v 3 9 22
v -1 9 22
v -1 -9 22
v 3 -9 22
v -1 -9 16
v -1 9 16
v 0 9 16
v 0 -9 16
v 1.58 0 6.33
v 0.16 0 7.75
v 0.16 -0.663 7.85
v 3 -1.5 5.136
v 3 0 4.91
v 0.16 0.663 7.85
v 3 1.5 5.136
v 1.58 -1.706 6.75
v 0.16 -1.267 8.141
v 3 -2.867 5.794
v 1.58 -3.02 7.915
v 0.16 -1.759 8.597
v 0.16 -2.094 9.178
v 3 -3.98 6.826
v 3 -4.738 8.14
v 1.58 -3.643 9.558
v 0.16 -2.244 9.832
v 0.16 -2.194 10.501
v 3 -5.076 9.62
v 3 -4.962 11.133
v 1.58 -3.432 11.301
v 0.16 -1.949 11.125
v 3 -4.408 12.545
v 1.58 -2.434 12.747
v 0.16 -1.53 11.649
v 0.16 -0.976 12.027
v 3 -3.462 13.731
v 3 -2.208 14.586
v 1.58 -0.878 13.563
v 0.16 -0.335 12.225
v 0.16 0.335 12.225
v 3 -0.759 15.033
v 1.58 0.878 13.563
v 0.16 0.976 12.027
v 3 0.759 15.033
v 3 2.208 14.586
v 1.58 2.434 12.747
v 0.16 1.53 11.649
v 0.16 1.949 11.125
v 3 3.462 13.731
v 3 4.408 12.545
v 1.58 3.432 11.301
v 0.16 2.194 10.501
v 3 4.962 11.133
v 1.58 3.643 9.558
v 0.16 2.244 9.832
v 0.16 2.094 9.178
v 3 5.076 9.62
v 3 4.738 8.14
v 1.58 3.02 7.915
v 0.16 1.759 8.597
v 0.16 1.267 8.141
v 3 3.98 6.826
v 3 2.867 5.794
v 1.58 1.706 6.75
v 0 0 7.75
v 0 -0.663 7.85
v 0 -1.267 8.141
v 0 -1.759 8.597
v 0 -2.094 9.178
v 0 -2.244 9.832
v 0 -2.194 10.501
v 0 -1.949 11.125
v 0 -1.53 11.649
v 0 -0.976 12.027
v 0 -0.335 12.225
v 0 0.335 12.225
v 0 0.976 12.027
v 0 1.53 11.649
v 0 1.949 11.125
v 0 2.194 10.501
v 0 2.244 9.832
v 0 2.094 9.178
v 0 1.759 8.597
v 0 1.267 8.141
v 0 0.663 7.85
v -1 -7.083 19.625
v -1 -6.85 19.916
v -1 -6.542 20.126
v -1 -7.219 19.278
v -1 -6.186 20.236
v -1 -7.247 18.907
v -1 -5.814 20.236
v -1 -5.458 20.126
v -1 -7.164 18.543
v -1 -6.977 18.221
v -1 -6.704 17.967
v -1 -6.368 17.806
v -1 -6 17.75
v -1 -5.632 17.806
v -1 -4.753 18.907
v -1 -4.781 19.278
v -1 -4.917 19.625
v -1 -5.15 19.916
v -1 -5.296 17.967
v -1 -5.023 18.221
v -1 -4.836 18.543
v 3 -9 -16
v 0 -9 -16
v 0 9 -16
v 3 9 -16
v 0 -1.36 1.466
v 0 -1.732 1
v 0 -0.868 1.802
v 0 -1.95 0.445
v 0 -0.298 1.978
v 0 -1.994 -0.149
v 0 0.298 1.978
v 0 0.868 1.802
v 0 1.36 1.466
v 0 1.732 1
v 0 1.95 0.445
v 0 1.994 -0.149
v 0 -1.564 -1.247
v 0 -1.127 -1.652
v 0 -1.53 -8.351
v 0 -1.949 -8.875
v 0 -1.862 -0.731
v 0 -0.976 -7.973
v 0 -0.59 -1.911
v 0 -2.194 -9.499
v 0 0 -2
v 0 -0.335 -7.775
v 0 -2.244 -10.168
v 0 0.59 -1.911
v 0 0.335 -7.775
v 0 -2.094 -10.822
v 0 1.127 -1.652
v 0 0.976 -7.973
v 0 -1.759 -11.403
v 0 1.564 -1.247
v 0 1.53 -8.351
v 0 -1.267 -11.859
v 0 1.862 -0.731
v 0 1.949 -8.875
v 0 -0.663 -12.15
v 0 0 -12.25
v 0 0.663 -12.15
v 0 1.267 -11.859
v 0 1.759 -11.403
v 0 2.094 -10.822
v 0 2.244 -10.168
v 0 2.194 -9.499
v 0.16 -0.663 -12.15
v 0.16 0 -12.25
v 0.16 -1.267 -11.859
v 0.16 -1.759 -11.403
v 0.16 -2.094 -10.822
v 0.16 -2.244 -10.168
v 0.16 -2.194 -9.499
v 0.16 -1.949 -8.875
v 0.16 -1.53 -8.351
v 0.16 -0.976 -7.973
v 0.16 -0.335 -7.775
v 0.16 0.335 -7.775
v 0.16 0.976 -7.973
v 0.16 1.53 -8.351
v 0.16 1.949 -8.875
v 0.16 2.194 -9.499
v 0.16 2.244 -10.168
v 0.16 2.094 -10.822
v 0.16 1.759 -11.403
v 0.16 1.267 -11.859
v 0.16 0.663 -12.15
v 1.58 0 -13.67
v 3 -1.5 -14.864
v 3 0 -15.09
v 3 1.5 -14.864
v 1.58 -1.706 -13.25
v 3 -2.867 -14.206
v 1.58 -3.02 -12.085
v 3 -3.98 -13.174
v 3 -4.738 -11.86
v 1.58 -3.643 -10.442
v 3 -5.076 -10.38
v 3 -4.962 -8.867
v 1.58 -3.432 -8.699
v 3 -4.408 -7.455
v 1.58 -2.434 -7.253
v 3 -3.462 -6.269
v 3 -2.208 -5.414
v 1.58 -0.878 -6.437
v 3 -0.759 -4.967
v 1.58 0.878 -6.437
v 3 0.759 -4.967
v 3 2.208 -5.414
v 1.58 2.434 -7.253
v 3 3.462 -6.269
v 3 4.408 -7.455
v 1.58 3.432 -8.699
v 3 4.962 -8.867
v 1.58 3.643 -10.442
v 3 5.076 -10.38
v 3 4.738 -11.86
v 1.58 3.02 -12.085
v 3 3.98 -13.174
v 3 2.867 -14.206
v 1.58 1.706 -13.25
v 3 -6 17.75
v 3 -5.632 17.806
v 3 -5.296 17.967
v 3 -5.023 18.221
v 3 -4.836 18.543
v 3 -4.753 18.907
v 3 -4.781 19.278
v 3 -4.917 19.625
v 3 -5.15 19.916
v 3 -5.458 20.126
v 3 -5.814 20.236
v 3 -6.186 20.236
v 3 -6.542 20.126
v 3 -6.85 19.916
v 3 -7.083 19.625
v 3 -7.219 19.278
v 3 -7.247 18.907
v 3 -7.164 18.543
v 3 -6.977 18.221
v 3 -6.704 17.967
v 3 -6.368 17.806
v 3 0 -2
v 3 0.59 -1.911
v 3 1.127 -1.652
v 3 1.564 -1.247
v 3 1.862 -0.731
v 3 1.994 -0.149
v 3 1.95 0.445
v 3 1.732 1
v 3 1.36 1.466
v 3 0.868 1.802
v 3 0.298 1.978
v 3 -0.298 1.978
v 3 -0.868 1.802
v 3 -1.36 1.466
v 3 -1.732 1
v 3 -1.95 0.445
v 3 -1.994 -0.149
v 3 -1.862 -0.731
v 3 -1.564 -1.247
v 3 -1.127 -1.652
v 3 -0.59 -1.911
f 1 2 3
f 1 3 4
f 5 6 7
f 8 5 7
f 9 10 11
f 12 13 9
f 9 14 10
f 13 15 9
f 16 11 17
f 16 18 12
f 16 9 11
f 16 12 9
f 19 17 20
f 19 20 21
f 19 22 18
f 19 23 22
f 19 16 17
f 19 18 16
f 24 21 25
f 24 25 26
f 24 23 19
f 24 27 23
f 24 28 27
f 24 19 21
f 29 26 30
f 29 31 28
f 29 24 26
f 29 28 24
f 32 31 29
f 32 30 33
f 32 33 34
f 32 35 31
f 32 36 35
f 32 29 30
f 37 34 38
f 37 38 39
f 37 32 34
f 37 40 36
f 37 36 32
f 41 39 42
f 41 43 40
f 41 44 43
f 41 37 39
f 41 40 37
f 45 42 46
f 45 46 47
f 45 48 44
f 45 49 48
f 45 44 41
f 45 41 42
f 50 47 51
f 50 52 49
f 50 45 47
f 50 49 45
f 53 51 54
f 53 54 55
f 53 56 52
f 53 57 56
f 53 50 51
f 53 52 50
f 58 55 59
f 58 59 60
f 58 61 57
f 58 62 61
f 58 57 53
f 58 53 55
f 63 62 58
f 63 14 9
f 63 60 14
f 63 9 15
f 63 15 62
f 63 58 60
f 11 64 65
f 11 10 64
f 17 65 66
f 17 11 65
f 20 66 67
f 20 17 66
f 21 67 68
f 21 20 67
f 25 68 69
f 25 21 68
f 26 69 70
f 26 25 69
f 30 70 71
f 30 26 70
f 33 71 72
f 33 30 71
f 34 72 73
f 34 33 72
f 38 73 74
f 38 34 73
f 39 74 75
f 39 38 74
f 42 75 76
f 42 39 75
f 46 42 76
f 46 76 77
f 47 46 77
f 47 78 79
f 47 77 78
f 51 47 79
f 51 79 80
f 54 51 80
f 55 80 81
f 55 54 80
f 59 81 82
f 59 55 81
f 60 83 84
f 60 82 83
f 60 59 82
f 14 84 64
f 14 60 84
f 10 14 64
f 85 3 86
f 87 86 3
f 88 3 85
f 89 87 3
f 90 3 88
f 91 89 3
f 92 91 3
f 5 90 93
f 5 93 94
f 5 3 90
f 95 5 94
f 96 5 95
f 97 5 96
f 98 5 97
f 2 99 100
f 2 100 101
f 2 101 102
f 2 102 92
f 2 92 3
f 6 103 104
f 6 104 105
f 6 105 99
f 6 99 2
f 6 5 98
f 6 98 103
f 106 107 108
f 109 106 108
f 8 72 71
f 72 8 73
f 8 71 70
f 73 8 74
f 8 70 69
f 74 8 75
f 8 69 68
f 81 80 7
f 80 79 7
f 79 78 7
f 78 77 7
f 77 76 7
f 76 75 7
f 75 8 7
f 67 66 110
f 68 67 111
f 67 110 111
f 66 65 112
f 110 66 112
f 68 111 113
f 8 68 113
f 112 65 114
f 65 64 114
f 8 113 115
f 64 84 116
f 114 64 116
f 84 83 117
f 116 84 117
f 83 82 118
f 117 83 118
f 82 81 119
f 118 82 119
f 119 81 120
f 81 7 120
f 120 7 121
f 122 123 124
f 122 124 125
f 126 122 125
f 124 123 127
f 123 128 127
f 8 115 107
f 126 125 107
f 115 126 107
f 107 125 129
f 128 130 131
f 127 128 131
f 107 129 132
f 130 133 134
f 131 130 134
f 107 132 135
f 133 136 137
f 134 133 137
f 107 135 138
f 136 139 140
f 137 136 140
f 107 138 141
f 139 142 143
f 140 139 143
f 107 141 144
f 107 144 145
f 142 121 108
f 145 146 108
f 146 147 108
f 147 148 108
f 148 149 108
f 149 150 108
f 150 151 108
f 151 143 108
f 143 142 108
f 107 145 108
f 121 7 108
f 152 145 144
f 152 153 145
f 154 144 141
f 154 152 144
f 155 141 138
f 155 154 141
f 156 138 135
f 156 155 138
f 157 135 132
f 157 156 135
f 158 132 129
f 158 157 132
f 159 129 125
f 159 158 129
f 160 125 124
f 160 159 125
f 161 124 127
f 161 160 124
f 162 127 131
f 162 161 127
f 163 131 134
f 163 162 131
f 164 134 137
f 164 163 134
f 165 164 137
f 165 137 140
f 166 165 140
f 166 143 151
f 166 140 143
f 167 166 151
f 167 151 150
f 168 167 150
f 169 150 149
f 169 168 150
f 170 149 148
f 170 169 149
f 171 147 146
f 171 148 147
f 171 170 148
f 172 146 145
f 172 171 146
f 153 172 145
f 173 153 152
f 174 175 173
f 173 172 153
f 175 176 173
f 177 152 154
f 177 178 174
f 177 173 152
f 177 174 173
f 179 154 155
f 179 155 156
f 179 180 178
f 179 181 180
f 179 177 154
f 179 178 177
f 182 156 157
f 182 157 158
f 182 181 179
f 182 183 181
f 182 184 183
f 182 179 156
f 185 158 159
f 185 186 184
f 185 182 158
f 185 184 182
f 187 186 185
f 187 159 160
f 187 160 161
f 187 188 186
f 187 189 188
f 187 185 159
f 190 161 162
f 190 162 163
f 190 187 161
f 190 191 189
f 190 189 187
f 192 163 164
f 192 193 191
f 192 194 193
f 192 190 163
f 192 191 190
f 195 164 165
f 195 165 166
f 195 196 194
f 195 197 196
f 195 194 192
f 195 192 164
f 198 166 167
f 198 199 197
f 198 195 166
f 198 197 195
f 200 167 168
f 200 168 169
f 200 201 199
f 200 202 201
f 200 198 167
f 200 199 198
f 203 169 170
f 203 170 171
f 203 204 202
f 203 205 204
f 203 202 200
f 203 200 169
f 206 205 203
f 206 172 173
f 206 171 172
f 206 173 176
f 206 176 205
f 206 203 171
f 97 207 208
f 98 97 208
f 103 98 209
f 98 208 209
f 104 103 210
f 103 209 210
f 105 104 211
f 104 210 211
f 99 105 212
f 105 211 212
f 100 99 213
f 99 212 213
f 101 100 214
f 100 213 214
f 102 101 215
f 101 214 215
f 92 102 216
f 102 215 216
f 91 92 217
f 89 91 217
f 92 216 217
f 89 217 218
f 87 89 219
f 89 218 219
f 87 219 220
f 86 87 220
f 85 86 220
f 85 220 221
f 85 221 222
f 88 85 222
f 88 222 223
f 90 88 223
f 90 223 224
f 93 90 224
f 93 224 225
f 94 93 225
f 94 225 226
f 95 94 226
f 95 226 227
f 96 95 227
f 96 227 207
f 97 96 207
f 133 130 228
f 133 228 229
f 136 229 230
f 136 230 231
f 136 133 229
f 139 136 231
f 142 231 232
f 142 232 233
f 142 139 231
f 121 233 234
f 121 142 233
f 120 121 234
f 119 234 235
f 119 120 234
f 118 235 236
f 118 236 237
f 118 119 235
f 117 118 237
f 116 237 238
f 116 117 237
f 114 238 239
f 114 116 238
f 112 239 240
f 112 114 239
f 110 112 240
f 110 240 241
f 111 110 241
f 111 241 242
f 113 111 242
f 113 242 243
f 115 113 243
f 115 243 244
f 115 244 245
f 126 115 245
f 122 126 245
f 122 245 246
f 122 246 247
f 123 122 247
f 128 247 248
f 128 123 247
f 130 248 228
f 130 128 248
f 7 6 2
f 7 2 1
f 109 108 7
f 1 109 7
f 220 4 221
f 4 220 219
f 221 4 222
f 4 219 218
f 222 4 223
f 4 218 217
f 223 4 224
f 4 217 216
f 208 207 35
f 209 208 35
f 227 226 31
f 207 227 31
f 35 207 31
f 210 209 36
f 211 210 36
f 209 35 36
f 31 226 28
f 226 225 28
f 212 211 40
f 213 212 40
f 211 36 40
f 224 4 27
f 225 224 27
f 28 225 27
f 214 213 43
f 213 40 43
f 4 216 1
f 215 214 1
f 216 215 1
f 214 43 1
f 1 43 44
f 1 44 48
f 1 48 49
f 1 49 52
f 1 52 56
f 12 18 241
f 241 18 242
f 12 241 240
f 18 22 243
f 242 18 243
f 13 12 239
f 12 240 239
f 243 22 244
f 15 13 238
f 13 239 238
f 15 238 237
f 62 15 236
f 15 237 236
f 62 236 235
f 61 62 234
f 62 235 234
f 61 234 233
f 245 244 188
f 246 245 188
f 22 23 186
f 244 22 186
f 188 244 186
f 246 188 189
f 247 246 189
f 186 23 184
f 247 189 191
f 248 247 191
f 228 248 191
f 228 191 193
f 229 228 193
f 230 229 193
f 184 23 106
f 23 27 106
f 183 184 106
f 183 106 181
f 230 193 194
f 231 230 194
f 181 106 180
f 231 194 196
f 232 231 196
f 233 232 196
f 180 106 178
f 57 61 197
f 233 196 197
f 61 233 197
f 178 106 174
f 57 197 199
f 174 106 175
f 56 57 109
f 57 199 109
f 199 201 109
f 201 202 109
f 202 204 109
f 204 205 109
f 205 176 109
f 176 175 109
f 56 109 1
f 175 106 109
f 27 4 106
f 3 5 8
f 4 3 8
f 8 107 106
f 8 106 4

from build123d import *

# Parameters (mm, degrees)
SKETCH1_W                                    = 32
SKETCH1_H                                    = 18
SKETCH1_R                                    = 2
BOSS_EXTRUDE1_DEPTH                          = 3
SKETCH3_W                                    = 4
SKETCH3_H                                    = 18
BOSS_EXTRUDE2_DEPTH                          = 6
SKETCH4_R                                    = 1.25
CUT_EXTRUDE1_DEPTH                           = 25.103941586
CSK_FOR_M4_HEX_SOCKET_COUNTERSUNK_HE_2_COUNT = 2
CSK_FOR_M4_HEX_SOCKET_COUNTERSUNK_HE_2_PITCH = 20


with BuildPart() as part:
    # Sketch1 → Boss-Extrude1 (new body)
    with BuildSketch(Plane(origin=(0, 0, 0), x_dir=(0, 0, -1), z_dir=(1, 0, 0))):
        Rectangle(SKETCH1_W, SKETCH1_H)
        with Locations((-10, 0)):
            Circle(SKETCH1_R, mode=Mode.SUBTRACT)
        Circle(SKETCH1_R, mode=Mode.SUBTRACT)
        with Locations((10, 0)):
            Circle(SKETCH1_R, mode=Mode.SUBTRACT)
    extrude(amount=BOSS_EXTRUDE1_DEPTH)

    # Sketch3 → Boss-Extrude2 (add)
    with BuildSketch(Plane.XY.offset(16)):
        with Locations((1, 0)):
            Rectangle(SKETCH3_W, SKETCH3_H)
    extrude(amount=BOSS_EXTRUDE2_DEPTH)

    # Sketch4 → Cut-Extrude1 (cut, through all)
    with BuildSketch(Plane(origin=(3, 0, 0), x_dir=(0, 0, -1), z_dir=(1, 0, 0))):
        with Locations((-19, -6)):
            Circle(SKETCH4_R)
    extrude(amount=-CUT_EXTRUDE1_DEPTH, mode=Mode.SUBTRACT)

    # Sketch5 → CSK for M4 Hex Socket Countersunk Head Screw1 (revolve, cut)
    with BuildSketch(Plane(origin=(3, 0, 10), x_dir=(0, 0, -1), z_dir=(0, 1, 0))):
        Polygon((0, 0), (0, 4.000025), (2.25, 4.000025), (2.25, 2.84), (5.09, 0), align=None)
    csk_for_m4_hex_socket_countersunk_head_s = revolve(axis=Axis((9.35, 0, 10), (-1, 0, 0)), mode=Mode.SUBTRACT)

    # CSK for M4 Hex Socket Countersunk He 2: CSK for M4 Hex Socket Countersunk Head Screw1 ×2
    with Locations(*[(0, 0, -i * CSK_FOR_M4_HEX_SOCKET_COUNTERSUNK_HE_2_PITCH) for i in range(1, CSK_FOR_M4_HEX_SOCKET_COUNTERSUNK_HE_2_COUNT)]):
        add(csk_for_m4_hex_socket_countersunk_head_s, mode=Mode.SUBTRACT)


solid = part.part
